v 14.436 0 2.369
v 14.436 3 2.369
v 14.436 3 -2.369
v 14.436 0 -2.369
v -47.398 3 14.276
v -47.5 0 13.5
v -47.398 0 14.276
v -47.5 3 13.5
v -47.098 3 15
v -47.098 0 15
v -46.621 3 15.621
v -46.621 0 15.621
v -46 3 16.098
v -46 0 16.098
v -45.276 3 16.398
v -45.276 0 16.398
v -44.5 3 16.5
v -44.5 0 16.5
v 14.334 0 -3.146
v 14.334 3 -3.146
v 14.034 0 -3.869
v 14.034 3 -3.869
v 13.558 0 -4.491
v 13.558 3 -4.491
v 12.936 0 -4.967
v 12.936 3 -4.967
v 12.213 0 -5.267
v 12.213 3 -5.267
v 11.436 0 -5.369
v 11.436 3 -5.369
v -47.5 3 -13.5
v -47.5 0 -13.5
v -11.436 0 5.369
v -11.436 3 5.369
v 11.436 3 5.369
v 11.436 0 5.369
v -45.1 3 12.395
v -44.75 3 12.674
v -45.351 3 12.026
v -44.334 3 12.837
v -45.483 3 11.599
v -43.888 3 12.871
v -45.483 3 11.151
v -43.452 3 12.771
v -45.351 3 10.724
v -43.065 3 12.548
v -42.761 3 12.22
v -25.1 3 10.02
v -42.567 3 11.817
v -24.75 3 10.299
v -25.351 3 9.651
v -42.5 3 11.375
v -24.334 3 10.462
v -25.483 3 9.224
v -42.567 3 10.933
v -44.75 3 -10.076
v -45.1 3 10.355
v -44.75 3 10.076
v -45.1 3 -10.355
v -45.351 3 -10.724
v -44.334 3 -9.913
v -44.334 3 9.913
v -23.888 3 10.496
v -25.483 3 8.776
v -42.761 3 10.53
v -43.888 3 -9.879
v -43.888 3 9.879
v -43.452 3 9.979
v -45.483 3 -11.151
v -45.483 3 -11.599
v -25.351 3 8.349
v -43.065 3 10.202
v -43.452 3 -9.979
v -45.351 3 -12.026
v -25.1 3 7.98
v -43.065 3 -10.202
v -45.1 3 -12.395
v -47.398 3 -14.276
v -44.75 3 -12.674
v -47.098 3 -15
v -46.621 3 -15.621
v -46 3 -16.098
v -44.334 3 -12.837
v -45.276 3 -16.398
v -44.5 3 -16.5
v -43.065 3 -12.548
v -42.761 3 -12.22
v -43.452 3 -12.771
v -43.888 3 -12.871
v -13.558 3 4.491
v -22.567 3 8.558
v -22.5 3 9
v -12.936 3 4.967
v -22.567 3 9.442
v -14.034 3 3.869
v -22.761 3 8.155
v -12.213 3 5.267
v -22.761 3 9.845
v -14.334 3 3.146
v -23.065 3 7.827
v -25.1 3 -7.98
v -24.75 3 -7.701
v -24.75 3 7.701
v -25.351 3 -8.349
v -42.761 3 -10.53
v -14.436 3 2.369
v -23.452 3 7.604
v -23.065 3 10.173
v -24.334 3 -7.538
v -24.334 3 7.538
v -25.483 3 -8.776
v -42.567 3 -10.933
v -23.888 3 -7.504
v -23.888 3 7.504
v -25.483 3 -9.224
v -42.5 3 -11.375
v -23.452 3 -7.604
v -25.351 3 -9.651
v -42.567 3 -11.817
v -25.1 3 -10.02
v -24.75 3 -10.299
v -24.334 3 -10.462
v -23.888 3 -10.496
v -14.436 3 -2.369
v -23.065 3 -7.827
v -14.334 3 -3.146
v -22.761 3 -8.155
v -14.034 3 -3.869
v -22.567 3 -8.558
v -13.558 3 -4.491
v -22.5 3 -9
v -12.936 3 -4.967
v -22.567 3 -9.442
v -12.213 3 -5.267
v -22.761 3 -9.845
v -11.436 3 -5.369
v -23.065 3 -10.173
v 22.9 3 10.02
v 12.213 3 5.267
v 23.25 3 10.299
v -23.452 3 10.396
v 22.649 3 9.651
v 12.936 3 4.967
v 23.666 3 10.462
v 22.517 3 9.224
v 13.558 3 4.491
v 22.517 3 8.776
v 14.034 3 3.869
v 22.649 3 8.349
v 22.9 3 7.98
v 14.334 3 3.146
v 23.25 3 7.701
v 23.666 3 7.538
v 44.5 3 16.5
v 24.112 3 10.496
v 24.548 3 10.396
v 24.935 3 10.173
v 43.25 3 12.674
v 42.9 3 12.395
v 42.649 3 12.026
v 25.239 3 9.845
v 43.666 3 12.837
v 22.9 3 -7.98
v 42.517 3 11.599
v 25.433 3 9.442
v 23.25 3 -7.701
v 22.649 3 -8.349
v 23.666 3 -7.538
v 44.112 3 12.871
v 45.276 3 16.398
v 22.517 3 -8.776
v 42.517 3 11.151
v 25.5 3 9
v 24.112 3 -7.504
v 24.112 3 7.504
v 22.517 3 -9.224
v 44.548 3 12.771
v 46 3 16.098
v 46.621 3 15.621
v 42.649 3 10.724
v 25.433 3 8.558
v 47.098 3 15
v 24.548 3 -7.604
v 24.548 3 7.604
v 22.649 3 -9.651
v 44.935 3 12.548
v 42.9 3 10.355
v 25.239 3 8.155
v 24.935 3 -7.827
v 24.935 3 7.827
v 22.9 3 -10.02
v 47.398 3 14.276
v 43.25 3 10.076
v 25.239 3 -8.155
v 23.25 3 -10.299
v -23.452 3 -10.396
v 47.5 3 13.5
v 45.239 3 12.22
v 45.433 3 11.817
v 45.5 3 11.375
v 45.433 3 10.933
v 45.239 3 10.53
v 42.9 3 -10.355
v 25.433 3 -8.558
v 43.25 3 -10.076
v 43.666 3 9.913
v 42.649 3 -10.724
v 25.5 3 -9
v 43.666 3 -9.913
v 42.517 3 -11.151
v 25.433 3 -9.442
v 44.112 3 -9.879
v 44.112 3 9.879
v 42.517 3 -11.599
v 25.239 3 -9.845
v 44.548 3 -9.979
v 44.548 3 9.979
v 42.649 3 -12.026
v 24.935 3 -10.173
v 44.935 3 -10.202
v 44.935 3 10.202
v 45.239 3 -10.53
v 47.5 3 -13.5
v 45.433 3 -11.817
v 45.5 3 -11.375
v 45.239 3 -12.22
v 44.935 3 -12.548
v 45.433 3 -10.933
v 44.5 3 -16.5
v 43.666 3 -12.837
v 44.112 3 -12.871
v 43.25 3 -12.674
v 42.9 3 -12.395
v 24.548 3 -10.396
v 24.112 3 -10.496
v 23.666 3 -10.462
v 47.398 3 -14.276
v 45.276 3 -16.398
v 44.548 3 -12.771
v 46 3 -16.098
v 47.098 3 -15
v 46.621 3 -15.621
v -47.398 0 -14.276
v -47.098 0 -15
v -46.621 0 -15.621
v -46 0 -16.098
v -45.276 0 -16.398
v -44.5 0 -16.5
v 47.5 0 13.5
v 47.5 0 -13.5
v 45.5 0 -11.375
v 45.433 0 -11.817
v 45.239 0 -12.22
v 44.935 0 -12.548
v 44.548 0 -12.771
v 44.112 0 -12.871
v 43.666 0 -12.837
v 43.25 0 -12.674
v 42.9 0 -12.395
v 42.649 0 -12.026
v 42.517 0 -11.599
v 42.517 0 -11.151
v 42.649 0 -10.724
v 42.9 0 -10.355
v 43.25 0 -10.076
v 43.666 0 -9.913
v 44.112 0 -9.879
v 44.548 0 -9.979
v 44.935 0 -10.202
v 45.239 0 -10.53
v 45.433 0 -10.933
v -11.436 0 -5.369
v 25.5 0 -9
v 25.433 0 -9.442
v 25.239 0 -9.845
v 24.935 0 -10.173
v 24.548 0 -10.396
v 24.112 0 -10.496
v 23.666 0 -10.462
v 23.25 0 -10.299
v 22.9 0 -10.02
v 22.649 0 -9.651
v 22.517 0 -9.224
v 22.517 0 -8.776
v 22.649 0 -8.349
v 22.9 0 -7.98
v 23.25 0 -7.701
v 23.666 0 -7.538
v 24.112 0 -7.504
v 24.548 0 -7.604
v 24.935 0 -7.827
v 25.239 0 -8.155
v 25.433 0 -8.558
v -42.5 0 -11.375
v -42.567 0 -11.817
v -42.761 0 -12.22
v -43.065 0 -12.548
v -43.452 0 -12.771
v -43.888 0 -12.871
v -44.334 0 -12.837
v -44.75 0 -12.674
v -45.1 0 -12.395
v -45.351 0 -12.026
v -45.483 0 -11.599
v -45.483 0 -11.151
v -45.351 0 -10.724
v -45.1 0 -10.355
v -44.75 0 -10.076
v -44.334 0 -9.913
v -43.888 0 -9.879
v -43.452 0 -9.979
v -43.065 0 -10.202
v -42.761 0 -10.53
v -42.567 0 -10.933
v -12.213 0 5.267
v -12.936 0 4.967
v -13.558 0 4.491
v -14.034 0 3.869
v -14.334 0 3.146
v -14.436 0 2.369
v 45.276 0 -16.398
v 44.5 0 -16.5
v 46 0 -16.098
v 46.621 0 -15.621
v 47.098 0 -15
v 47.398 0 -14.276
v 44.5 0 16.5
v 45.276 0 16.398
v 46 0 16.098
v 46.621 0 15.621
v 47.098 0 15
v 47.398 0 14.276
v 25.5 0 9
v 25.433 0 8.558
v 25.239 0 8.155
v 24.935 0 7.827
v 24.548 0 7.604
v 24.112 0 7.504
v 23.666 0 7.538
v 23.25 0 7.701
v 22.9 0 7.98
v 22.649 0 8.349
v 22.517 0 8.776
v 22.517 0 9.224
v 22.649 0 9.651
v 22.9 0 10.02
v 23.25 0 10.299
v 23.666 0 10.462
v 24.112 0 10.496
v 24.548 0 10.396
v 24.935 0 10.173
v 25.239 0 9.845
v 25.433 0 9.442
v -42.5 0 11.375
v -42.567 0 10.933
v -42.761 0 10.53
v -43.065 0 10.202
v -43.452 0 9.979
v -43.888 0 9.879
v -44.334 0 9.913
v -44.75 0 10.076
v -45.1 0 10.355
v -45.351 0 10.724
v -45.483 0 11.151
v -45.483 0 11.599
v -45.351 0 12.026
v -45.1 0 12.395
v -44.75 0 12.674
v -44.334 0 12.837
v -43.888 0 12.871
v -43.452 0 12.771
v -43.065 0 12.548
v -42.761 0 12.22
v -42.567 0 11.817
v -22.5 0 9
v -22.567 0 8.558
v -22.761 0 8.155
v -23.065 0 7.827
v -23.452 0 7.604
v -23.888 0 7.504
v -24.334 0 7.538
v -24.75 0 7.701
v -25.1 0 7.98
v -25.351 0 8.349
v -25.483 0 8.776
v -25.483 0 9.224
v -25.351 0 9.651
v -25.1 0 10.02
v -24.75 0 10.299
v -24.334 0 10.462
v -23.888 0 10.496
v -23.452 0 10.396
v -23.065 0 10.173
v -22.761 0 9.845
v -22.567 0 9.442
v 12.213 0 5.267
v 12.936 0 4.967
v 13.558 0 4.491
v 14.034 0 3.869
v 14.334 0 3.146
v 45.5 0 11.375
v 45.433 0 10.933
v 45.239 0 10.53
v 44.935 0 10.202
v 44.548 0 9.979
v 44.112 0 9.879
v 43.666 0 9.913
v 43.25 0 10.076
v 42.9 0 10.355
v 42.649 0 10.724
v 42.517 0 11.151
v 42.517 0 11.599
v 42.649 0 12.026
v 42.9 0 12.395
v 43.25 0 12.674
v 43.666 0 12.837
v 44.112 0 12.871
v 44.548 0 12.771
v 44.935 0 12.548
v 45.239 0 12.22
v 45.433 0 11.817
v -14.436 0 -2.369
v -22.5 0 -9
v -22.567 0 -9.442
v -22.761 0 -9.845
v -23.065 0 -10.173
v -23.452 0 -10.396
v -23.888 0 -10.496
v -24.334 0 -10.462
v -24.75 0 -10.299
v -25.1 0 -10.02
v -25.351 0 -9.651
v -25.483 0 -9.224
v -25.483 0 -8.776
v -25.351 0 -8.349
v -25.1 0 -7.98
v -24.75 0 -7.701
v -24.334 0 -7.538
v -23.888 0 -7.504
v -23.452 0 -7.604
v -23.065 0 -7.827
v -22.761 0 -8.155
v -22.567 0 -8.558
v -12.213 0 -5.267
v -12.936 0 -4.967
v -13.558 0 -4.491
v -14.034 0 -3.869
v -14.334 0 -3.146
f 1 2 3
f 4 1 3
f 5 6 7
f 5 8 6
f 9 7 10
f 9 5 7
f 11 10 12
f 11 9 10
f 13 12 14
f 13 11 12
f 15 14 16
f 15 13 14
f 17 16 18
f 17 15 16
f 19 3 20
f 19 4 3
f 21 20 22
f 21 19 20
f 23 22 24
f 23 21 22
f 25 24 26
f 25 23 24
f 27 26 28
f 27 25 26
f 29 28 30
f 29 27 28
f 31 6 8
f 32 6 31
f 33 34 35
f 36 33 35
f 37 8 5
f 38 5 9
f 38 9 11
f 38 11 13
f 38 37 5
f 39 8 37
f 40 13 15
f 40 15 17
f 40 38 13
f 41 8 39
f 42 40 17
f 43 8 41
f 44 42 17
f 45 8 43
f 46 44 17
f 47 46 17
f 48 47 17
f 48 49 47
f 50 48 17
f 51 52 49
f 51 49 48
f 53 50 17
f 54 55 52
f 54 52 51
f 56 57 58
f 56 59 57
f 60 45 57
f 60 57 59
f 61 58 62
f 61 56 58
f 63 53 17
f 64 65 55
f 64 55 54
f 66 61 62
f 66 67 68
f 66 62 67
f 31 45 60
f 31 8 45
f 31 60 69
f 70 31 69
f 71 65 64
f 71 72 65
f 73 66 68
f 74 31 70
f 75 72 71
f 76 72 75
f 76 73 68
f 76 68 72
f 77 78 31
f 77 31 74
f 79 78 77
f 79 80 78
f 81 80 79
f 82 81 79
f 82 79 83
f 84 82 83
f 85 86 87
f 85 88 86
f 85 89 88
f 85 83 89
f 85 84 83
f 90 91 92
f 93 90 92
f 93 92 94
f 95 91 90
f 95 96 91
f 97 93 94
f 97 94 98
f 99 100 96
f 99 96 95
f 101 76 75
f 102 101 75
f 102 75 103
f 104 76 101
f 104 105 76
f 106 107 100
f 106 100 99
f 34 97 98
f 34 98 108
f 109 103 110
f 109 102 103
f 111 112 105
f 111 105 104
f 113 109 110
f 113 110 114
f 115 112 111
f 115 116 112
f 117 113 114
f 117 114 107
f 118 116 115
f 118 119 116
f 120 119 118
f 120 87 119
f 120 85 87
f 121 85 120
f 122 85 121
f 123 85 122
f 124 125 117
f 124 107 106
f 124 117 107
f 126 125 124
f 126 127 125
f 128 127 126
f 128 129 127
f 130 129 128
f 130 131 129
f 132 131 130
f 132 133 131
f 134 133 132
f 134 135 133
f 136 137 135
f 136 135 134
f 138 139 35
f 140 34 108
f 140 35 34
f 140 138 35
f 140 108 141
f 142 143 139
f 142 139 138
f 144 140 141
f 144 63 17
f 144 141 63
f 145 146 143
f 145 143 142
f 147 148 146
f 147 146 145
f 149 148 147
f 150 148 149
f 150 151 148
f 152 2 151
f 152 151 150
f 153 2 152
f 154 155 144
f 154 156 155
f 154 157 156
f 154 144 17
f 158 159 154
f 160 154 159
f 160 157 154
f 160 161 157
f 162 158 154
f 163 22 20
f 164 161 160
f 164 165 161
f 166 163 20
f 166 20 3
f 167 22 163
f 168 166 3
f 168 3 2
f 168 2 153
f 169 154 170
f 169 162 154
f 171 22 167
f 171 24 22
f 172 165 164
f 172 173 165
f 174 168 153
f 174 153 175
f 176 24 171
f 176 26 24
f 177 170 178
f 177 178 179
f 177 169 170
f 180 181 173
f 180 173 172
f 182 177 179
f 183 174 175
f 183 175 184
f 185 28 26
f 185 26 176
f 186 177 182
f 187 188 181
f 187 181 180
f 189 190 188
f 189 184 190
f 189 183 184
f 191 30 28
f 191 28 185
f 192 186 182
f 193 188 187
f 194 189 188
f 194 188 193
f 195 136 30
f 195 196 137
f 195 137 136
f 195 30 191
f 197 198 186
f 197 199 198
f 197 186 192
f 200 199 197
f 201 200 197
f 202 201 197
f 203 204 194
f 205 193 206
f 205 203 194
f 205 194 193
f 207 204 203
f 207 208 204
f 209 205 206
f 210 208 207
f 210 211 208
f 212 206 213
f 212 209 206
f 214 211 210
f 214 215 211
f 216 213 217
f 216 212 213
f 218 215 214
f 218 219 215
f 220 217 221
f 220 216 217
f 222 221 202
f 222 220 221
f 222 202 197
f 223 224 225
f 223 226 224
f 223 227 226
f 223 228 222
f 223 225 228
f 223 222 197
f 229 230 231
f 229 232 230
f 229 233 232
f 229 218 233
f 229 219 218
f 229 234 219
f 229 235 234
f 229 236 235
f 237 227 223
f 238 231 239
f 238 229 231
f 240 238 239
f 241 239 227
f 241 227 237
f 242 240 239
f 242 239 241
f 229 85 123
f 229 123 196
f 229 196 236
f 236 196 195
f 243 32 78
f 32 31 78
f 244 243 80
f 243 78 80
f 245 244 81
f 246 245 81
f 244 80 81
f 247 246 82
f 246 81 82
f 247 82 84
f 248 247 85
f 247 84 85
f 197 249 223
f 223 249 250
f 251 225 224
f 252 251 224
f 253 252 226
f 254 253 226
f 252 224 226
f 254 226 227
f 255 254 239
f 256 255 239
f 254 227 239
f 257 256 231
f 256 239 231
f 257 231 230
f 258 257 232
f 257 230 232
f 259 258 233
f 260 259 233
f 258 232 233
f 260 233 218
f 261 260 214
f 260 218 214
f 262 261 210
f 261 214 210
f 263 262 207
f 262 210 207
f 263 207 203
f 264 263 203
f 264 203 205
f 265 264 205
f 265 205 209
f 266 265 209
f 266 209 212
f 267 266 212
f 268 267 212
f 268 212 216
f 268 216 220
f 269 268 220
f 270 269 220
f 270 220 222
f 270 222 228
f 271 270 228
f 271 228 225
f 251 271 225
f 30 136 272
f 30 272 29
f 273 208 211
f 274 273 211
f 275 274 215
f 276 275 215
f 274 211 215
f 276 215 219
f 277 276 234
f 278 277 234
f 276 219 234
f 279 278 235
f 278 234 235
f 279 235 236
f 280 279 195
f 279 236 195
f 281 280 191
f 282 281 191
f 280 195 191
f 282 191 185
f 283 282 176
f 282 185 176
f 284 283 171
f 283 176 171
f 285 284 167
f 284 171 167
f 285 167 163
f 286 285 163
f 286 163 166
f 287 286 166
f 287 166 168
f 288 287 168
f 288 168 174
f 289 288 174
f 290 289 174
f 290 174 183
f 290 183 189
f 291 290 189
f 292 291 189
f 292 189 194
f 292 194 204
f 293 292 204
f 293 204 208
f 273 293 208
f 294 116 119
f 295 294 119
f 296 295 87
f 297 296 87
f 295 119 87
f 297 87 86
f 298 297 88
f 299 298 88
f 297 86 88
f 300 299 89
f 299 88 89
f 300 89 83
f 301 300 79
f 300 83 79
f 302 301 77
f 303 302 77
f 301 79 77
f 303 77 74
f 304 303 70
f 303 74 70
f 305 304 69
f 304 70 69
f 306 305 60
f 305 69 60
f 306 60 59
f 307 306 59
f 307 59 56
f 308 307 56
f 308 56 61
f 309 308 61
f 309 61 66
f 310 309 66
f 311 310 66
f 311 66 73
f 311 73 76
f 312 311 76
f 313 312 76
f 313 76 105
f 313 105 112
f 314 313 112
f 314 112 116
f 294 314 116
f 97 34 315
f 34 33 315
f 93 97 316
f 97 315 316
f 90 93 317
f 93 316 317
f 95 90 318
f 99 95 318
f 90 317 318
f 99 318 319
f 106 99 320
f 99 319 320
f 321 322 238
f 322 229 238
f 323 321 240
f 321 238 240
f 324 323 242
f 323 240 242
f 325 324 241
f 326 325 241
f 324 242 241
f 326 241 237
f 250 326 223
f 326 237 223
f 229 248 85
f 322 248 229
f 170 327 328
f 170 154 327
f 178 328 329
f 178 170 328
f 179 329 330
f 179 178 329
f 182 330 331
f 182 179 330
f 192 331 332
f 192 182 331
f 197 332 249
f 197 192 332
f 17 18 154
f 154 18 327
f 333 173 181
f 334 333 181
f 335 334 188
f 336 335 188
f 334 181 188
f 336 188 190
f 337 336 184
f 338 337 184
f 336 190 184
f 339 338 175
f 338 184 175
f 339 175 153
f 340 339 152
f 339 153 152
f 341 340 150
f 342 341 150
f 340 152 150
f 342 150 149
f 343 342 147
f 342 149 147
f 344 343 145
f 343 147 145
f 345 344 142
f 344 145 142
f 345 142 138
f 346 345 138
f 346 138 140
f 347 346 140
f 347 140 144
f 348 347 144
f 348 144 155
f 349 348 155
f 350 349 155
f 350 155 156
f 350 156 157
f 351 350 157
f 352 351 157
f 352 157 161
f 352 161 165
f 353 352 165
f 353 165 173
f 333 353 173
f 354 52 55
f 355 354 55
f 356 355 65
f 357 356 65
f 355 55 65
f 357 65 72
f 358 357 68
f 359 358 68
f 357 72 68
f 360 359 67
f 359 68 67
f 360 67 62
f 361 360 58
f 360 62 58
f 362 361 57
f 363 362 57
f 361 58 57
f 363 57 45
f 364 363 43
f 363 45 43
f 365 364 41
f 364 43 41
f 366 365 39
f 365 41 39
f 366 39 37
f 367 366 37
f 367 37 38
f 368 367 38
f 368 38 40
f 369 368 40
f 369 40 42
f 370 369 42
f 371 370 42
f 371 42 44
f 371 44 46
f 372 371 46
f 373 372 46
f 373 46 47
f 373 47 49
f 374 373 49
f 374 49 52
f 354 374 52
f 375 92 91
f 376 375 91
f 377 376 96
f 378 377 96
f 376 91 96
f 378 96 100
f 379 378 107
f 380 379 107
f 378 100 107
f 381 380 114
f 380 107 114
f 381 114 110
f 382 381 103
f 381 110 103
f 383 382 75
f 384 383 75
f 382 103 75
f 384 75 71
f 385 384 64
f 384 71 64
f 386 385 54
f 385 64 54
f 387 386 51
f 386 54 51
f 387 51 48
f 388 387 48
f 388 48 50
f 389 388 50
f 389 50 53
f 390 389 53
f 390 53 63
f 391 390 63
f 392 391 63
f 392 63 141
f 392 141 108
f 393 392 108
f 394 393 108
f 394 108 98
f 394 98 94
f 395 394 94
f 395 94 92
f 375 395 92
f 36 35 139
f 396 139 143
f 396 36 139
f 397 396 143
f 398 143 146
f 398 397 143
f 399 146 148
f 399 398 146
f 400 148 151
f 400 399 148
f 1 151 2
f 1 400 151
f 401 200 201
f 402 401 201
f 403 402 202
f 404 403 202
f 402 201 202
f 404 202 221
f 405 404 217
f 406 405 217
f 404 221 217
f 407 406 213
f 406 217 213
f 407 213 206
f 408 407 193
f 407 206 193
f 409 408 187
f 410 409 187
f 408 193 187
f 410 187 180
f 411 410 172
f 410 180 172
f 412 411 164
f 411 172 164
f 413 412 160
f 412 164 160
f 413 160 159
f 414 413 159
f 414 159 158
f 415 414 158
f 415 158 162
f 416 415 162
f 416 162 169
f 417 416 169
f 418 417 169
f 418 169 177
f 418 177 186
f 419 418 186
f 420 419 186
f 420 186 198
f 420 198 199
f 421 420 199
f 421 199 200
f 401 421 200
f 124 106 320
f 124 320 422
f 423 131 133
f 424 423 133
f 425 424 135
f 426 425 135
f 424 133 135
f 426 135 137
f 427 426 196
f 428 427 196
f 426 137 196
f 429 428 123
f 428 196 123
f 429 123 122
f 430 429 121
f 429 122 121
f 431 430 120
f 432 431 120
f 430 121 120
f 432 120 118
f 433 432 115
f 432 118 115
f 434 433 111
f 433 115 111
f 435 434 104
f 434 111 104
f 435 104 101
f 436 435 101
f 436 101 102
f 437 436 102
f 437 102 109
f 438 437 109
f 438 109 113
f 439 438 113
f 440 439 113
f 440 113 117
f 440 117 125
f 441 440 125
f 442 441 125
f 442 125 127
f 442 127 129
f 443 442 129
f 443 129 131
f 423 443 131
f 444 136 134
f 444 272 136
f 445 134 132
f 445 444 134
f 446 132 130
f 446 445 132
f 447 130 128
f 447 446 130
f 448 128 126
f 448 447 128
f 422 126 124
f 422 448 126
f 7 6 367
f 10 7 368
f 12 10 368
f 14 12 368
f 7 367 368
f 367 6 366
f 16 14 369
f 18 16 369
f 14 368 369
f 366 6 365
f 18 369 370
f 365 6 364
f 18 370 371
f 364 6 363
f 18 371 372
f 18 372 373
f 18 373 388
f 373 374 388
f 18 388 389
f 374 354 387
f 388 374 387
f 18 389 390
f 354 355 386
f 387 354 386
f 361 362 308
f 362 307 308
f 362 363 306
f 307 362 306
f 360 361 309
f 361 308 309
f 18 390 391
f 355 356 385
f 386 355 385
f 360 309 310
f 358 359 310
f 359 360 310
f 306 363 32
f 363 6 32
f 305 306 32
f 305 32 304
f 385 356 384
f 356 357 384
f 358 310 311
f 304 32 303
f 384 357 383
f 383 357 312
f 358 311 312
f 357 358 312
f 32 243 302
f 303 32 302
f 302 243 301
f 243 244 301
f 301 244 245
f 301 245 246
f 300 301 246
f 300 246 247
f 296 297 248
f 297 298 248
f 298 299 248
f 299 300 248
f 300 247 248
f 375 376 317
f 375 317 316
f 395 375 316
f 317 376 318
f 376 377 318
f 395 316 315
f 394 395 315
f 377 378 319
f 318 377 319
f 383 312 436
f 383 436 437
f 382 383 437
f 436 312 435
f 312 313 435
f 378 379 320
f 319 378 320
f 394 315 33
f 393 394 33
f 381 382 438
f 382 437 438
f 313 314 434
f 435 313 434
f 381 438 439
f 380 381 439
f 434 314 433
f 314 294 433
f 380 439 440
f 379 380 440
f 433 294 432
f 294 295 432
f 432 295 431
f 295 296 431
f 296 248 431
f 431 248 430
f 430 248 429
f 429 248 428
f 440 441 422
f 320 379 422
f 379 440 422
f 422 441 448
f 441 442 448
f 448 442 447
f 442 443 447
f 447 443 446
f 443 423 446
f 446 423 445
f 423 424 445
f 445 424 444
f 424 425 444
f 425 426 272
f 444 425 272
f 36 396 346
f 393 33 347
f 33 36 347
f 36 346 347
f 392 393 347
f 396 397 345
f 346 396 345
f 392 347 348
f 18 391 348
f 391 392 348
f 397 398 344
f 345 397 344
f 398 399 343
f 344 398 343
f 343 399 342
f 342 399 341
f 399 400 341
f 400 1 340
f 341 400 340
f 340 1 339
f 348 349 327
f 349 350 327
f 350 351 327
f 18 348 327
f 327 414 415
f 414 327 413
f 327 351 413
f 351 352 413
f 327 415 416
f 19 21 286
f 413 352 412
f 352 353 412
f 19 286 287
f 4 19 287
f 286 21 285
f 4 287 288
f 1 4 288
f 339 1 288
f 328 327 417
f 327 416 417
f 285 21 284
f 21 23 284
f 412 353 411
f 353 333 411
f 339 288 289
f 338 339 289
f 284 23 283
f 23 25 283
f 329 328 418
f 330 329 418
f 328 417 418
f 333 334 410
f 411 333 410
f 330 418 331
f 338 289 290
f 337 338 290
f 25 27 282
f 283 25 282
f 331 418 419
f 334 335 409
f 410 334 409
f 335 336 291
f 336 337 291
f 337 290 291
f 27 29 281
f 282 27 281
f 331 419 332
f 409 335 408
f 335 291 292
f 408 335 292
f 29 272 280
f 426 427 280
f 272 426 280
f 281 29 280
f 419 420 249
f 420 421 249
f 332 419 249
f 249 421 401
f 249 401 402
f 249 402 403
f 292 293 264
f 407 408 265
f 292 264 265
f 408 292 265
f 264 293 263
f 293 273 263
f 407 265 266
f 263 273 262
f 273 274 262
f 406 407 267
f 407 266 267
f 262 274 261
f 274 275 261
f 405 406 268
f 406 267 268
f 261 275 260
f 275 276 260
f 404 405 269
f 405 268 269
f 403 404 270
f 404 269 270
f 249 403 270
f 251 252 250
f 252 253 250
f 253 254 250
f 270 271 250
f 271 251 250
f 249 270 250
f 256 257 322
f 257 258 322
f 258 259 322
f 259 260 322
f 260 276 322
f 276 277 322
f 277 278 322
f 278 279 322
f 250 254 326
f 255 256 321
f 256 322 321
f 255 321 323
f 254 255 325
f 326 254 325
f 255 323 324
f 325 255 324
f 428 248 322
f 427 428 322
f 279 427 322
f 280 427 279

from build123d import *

# Parameters (mm, degrees)
SKETCH_1_W          = 95
SKETCH_1_H          = 33
EXTRUDE_1_DEPTH     = 3
SKETCH_2_R          = 1.5
CUT_EXTRUDE_1_DEPTH = 4
SKETCH_3_R          = 1.5
CUT_EXTRUDE_2_DEPTH = 4
FILLET_1_R          = 3
SKETCH_4_W          = 28.872486122
SKETCH_4_H          = 10.738590994
CUT_EXTRUDE_3_DEPTH = 4
FILLET_2_R          = 3


with BuildPart() as part:
    # 草图1 → 凸台-拉伸1 (new body)
    with BuildSketch(Plane(origin=(0, 0, 0), x_dir=(1, 0, 0), z_dir=(0, 1, 0))):
        Rectangle(SKETCH_1_W, SKETCH_1_H)
    extrude(amount=EXTRUDE_1_DEPTH)

    # 草图2 → 切除-拉伸1 (cut, through all)
    with BuildSketch(Plane(origin=(0, 3, 0), x_dir=(1, 0, 0), z_dir=(0, 1, 0))):
        with Locations((-44, 11.375)):
            Circle(SKETCH_2_R)
        with Locations((-44, -11.375)):
            Circle(SKETCH_2_R)
        with Locations((44, -11.375)):
            Circle(SKETCH_2_R)
        with Locations((44, 11.375)):
            Circle(SKETCH_2_R)
    extrude(amount=-CUT_EXTRUDE_1_DEPTH, mode=Mode.SUBTRACT)

    # 草图3 → 切除-拉伸2 (cut, through all)
    with BuildSketch(Plane(origin=(0, 3, 0), x_dir=(1, 0, 0), z_dir=(0, 1, 0))):
        with Locations((-24, 9)):
            Circle(SKETCH_3_R)
        with Locations((24, 9)):
            Circle(SKETCH_3_R)
        with Locations((-24, -9)):
            Circle(SKETCH_3_R)
        with Locations((24, -9)):
            Circle(SKETCH_3_R)
    extrude(amount=-CUT_EXTRUDE_2_DEPTH, mode=Mode.SUBTRACT)

    # 圆角1
    fillet_1_edges = [part.edges().sort_by_distance(p)[0] for p in [
        (-47.5, 1.5, -16.5),
        (47.5, 1.5, -16.5),
        (47.5, 1.5, 16.5),
        (-47.5, 1.5, 16.5),
    ]]
    fillet(fillet_1_edges, radius=FILLET_1_R)

    # 草图4 → 切除-拉伸3 (cut, through all)
    with BuildSketch(Plane(origin=(0, 3, 0), x_dir=(1, 0, 0), z_dir=(0, 1, 0))):
        Rectangle(SKETCH_4_W, SKETCH_4_H)
    extrude(amount=-CUT_EXTRUDE_3_DEPTH, mode=Mode.SUBTRACT)

    # 圆角2
    fillet_2_edges = [part.edges().sort_by_distance(p)[0] for p in [
        (-14.436243061, 1.5, 5.369295497),
        (-14.436243061, 1.5, -5.369295497),
        (14.436243061, 1.5, -5.369295497),
        (14.436243061, 1.5, 5.369295497),
    ]]
    fillet(fillet_2_edges, radius=FILLET_2_R)


solid = part.part
